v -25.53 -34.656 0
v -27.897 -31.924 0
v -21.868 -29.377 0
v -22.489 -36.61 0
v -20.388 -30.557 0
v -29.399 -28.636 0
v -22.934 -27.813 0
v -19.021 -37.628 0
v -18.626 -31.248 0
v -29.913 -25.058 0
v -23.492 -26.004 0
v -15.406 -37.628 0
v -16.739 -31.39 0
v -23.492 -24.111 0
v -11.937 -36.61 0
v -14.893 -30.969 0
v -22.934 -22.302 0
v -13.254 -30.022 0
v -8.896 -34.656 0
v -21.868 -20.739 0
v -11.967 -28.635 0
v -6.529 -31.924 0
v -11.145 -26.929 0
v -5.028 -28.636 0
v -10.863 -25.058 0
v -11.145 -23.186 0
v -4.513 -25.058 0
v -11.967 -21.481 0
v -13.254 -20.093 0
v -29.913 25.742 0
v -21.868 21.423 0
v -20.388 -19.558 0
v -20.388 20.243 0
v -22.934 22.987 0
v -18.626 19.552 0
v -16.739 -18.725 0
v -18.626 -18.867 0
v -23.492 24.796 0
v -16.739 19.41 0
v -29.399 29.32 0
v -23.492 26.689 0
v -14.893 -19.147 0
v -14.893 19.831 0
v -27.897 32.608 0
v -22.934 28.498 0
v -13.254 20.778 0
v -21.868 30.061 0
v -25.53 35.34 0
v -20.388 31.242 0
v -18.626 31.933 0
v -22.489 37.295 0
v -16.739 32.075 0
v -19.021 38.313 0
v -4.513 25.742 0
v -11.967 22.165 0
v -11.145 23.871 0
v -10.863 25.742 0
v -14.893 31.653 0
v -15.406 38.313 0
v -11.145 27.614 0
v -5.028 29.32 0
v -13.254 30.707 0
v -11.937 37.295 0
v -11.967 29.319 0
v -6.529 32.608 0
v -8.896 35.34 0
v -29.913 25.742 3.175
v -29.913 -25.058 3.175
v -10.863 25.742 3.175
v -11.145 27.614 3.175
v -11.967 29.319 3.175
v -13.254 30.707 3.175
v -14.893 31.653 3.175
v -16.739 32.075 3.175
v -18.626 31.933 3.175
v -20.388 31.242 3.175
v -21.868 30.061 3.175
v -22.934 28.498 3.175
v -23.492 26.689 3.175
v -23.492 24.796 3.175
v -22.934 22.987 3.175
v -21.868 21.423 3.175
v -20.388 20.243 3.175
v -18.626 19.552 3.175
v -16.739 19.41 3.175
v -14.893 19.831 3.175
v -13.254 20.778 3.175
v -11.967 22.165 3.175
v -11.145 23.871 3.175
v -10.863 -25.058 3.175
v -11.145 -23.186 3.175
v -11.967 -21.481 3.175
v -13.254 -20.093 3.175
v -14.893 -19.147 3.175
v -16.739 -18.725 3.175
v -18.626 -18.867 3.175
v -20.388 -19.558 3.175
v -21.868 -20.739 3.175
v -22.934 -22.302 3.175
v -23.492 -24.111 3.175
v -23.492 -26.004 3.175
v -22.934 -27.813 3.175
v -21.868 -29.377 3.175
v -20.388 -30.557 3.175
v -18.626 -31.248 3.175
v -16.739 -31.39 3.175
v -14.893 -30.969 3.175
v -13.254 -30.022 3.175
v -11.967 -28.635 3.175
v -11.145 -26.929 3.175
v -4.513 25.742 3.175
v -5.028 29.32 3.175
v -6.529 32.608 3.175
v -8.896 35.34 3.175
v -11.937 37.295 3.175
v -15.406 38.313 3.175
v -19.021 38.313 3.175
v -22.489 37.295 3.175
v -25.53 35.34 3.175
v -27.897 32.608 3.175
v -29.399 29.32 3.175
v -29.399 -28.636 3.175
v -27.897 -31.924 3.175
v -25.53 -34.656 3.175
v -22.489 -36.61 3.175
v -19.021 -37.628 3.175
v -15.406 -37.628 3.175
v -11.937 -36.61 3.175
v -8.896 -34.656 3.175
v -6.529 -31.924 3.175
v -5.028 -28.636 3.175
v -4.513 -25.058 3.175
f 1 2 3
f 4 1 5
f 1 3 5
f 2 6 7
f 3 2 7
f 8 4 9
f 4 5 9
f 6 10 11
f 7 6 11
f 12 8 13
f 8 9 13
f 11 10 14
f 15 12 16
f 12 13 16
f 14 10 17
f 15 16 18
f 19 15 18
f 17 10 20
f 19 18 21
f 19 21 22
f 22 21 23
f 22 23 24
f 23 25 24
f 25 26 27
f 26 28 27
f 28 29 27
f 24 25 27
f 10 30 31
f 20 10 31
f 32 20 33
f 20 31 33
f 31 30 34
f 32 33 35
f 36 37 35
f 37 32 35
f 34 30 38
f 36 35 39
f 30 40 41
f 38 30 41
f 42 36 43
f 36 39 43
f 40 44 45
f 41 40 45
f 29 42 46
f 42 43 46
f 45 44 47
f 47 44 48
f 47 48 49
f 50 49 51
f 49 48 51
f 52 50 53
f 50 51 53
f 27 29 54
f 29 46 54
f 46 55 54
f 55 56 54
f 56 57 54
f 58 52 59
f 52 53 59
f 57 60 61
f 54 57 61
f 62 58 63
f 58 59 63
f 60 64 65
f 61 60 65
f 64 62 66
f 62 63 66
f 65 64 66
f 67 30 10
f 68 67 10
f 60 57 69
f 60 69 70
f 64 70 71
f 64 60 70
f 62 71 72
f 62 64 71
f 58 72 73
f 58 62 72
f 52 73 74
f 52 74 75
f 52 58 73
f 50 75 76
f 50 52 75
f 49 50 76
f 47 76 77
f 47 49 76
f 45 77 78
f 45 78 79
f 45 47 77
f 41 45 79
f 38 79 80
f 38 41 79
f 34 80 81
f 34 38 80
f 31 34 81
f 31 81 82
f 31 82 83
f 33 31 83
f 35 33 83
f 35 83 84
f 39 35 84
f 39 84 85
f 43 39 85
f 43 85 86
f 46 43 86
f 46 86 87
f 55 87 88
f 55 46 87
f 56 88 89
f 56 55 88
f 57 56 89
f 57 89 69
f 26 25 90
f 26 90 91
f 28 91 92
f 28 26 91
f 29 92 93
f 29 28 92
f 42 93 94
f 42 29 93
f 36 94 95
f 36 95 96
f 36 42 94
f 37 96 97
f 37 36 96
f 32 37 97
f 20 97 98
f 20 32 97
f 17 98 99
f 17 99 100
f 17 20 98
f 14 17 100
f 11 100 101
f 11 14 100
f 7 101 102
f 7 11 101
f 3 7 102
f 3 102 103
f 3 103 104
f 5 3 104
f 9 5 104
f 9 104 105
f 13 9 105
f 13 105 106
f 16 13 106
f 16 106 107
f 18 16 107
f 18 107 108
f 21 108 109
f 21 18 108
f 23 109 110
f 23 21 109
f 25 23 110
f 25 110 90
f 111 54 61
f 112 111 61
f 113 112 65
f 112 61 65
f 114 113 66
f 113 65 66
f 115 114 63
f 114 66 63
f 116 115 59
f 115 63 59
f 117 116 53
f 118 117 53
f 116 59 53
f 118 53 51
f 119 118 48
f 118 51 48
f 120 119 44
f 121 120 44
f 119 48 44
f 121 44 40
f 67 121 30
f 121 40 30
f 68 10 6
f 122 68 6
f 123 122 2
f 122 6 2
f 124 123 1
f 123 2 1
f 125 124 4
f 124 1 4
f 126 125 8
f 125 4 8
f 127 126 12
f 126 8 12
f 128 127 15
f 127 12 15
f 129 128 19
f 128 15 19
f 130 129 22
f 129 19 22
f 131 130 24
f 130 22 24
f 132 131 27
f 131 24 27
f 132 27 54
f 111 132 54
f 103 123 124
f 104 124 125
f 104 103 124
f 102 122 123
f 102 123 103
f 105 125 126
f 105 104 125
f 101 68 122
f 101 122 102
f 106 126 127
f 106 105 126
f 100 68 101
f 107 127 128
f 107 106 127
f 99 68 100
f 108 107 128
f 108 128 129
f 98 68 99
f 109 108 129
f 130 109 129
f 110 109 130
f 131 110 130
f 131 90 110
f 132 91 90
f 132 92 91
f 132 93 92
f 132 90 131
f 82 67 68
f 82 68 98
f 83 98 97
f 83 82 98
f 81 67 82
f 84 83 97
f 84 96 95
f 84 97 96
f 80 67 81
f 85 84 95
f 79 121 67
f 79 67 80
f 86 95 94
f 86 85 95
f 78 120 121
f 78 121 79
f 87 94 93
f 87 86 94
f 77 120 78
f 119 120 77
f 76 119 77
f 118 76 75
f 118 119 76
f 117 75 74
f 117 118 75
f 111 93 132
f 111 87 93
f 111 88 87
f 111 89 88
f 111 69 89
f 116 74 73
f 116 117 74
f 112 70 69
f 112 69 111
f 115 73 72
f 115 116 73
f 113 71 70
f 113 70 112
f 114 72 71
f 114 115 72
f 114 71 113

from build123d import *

# Parameters (mm, degrees)
SKETCH1_R           = 12.7
SKETCH1_R_2         = 6.35
BOSS_EXTRUDE1_DEPTH = 3.175


with BuildPart() as part:
    # Sketch1 → Boss-Extrude1 (new body)
    with BuildSketch(Plane.XY):
        with Locations((-17.213222871, 25.742348898)):
            Circle(SKETCH1_R)
        with Locations((-17.213222871, 25.742348898)):
            Circle(SKETCH1_R_2, mode=Mode.SUBTRACT)
        with BuildLine():
            Line((-29.913222871, 25.742348898), (-29.913222871, -25.057651102))
            ThreePointArc((-29.913222871, -25.057651102), (-17.213222871, -12.357651102), (-4.513222871, -25.057651102))
            Line((-4.513222871, -25.057651102), (-4.513222871, 25.742348898))
            ThreePointArc((-4.513222871, 25.742348898), (-17.213222871, 13.042348898), (-29.913222871, 25.742348898))
        make_face()
        with Locations((-17.213222871, -25.057651102)):
            Circle(SKETCH1_R)
        with Locations((-17.213222871, -25.057651102)):
            Circle(SKETCH1_R_2, mode=Mode.SUBTRACT)
    extrude(amount=BOSS_EXTRUDE1_DEPTH)


solid = part.part
